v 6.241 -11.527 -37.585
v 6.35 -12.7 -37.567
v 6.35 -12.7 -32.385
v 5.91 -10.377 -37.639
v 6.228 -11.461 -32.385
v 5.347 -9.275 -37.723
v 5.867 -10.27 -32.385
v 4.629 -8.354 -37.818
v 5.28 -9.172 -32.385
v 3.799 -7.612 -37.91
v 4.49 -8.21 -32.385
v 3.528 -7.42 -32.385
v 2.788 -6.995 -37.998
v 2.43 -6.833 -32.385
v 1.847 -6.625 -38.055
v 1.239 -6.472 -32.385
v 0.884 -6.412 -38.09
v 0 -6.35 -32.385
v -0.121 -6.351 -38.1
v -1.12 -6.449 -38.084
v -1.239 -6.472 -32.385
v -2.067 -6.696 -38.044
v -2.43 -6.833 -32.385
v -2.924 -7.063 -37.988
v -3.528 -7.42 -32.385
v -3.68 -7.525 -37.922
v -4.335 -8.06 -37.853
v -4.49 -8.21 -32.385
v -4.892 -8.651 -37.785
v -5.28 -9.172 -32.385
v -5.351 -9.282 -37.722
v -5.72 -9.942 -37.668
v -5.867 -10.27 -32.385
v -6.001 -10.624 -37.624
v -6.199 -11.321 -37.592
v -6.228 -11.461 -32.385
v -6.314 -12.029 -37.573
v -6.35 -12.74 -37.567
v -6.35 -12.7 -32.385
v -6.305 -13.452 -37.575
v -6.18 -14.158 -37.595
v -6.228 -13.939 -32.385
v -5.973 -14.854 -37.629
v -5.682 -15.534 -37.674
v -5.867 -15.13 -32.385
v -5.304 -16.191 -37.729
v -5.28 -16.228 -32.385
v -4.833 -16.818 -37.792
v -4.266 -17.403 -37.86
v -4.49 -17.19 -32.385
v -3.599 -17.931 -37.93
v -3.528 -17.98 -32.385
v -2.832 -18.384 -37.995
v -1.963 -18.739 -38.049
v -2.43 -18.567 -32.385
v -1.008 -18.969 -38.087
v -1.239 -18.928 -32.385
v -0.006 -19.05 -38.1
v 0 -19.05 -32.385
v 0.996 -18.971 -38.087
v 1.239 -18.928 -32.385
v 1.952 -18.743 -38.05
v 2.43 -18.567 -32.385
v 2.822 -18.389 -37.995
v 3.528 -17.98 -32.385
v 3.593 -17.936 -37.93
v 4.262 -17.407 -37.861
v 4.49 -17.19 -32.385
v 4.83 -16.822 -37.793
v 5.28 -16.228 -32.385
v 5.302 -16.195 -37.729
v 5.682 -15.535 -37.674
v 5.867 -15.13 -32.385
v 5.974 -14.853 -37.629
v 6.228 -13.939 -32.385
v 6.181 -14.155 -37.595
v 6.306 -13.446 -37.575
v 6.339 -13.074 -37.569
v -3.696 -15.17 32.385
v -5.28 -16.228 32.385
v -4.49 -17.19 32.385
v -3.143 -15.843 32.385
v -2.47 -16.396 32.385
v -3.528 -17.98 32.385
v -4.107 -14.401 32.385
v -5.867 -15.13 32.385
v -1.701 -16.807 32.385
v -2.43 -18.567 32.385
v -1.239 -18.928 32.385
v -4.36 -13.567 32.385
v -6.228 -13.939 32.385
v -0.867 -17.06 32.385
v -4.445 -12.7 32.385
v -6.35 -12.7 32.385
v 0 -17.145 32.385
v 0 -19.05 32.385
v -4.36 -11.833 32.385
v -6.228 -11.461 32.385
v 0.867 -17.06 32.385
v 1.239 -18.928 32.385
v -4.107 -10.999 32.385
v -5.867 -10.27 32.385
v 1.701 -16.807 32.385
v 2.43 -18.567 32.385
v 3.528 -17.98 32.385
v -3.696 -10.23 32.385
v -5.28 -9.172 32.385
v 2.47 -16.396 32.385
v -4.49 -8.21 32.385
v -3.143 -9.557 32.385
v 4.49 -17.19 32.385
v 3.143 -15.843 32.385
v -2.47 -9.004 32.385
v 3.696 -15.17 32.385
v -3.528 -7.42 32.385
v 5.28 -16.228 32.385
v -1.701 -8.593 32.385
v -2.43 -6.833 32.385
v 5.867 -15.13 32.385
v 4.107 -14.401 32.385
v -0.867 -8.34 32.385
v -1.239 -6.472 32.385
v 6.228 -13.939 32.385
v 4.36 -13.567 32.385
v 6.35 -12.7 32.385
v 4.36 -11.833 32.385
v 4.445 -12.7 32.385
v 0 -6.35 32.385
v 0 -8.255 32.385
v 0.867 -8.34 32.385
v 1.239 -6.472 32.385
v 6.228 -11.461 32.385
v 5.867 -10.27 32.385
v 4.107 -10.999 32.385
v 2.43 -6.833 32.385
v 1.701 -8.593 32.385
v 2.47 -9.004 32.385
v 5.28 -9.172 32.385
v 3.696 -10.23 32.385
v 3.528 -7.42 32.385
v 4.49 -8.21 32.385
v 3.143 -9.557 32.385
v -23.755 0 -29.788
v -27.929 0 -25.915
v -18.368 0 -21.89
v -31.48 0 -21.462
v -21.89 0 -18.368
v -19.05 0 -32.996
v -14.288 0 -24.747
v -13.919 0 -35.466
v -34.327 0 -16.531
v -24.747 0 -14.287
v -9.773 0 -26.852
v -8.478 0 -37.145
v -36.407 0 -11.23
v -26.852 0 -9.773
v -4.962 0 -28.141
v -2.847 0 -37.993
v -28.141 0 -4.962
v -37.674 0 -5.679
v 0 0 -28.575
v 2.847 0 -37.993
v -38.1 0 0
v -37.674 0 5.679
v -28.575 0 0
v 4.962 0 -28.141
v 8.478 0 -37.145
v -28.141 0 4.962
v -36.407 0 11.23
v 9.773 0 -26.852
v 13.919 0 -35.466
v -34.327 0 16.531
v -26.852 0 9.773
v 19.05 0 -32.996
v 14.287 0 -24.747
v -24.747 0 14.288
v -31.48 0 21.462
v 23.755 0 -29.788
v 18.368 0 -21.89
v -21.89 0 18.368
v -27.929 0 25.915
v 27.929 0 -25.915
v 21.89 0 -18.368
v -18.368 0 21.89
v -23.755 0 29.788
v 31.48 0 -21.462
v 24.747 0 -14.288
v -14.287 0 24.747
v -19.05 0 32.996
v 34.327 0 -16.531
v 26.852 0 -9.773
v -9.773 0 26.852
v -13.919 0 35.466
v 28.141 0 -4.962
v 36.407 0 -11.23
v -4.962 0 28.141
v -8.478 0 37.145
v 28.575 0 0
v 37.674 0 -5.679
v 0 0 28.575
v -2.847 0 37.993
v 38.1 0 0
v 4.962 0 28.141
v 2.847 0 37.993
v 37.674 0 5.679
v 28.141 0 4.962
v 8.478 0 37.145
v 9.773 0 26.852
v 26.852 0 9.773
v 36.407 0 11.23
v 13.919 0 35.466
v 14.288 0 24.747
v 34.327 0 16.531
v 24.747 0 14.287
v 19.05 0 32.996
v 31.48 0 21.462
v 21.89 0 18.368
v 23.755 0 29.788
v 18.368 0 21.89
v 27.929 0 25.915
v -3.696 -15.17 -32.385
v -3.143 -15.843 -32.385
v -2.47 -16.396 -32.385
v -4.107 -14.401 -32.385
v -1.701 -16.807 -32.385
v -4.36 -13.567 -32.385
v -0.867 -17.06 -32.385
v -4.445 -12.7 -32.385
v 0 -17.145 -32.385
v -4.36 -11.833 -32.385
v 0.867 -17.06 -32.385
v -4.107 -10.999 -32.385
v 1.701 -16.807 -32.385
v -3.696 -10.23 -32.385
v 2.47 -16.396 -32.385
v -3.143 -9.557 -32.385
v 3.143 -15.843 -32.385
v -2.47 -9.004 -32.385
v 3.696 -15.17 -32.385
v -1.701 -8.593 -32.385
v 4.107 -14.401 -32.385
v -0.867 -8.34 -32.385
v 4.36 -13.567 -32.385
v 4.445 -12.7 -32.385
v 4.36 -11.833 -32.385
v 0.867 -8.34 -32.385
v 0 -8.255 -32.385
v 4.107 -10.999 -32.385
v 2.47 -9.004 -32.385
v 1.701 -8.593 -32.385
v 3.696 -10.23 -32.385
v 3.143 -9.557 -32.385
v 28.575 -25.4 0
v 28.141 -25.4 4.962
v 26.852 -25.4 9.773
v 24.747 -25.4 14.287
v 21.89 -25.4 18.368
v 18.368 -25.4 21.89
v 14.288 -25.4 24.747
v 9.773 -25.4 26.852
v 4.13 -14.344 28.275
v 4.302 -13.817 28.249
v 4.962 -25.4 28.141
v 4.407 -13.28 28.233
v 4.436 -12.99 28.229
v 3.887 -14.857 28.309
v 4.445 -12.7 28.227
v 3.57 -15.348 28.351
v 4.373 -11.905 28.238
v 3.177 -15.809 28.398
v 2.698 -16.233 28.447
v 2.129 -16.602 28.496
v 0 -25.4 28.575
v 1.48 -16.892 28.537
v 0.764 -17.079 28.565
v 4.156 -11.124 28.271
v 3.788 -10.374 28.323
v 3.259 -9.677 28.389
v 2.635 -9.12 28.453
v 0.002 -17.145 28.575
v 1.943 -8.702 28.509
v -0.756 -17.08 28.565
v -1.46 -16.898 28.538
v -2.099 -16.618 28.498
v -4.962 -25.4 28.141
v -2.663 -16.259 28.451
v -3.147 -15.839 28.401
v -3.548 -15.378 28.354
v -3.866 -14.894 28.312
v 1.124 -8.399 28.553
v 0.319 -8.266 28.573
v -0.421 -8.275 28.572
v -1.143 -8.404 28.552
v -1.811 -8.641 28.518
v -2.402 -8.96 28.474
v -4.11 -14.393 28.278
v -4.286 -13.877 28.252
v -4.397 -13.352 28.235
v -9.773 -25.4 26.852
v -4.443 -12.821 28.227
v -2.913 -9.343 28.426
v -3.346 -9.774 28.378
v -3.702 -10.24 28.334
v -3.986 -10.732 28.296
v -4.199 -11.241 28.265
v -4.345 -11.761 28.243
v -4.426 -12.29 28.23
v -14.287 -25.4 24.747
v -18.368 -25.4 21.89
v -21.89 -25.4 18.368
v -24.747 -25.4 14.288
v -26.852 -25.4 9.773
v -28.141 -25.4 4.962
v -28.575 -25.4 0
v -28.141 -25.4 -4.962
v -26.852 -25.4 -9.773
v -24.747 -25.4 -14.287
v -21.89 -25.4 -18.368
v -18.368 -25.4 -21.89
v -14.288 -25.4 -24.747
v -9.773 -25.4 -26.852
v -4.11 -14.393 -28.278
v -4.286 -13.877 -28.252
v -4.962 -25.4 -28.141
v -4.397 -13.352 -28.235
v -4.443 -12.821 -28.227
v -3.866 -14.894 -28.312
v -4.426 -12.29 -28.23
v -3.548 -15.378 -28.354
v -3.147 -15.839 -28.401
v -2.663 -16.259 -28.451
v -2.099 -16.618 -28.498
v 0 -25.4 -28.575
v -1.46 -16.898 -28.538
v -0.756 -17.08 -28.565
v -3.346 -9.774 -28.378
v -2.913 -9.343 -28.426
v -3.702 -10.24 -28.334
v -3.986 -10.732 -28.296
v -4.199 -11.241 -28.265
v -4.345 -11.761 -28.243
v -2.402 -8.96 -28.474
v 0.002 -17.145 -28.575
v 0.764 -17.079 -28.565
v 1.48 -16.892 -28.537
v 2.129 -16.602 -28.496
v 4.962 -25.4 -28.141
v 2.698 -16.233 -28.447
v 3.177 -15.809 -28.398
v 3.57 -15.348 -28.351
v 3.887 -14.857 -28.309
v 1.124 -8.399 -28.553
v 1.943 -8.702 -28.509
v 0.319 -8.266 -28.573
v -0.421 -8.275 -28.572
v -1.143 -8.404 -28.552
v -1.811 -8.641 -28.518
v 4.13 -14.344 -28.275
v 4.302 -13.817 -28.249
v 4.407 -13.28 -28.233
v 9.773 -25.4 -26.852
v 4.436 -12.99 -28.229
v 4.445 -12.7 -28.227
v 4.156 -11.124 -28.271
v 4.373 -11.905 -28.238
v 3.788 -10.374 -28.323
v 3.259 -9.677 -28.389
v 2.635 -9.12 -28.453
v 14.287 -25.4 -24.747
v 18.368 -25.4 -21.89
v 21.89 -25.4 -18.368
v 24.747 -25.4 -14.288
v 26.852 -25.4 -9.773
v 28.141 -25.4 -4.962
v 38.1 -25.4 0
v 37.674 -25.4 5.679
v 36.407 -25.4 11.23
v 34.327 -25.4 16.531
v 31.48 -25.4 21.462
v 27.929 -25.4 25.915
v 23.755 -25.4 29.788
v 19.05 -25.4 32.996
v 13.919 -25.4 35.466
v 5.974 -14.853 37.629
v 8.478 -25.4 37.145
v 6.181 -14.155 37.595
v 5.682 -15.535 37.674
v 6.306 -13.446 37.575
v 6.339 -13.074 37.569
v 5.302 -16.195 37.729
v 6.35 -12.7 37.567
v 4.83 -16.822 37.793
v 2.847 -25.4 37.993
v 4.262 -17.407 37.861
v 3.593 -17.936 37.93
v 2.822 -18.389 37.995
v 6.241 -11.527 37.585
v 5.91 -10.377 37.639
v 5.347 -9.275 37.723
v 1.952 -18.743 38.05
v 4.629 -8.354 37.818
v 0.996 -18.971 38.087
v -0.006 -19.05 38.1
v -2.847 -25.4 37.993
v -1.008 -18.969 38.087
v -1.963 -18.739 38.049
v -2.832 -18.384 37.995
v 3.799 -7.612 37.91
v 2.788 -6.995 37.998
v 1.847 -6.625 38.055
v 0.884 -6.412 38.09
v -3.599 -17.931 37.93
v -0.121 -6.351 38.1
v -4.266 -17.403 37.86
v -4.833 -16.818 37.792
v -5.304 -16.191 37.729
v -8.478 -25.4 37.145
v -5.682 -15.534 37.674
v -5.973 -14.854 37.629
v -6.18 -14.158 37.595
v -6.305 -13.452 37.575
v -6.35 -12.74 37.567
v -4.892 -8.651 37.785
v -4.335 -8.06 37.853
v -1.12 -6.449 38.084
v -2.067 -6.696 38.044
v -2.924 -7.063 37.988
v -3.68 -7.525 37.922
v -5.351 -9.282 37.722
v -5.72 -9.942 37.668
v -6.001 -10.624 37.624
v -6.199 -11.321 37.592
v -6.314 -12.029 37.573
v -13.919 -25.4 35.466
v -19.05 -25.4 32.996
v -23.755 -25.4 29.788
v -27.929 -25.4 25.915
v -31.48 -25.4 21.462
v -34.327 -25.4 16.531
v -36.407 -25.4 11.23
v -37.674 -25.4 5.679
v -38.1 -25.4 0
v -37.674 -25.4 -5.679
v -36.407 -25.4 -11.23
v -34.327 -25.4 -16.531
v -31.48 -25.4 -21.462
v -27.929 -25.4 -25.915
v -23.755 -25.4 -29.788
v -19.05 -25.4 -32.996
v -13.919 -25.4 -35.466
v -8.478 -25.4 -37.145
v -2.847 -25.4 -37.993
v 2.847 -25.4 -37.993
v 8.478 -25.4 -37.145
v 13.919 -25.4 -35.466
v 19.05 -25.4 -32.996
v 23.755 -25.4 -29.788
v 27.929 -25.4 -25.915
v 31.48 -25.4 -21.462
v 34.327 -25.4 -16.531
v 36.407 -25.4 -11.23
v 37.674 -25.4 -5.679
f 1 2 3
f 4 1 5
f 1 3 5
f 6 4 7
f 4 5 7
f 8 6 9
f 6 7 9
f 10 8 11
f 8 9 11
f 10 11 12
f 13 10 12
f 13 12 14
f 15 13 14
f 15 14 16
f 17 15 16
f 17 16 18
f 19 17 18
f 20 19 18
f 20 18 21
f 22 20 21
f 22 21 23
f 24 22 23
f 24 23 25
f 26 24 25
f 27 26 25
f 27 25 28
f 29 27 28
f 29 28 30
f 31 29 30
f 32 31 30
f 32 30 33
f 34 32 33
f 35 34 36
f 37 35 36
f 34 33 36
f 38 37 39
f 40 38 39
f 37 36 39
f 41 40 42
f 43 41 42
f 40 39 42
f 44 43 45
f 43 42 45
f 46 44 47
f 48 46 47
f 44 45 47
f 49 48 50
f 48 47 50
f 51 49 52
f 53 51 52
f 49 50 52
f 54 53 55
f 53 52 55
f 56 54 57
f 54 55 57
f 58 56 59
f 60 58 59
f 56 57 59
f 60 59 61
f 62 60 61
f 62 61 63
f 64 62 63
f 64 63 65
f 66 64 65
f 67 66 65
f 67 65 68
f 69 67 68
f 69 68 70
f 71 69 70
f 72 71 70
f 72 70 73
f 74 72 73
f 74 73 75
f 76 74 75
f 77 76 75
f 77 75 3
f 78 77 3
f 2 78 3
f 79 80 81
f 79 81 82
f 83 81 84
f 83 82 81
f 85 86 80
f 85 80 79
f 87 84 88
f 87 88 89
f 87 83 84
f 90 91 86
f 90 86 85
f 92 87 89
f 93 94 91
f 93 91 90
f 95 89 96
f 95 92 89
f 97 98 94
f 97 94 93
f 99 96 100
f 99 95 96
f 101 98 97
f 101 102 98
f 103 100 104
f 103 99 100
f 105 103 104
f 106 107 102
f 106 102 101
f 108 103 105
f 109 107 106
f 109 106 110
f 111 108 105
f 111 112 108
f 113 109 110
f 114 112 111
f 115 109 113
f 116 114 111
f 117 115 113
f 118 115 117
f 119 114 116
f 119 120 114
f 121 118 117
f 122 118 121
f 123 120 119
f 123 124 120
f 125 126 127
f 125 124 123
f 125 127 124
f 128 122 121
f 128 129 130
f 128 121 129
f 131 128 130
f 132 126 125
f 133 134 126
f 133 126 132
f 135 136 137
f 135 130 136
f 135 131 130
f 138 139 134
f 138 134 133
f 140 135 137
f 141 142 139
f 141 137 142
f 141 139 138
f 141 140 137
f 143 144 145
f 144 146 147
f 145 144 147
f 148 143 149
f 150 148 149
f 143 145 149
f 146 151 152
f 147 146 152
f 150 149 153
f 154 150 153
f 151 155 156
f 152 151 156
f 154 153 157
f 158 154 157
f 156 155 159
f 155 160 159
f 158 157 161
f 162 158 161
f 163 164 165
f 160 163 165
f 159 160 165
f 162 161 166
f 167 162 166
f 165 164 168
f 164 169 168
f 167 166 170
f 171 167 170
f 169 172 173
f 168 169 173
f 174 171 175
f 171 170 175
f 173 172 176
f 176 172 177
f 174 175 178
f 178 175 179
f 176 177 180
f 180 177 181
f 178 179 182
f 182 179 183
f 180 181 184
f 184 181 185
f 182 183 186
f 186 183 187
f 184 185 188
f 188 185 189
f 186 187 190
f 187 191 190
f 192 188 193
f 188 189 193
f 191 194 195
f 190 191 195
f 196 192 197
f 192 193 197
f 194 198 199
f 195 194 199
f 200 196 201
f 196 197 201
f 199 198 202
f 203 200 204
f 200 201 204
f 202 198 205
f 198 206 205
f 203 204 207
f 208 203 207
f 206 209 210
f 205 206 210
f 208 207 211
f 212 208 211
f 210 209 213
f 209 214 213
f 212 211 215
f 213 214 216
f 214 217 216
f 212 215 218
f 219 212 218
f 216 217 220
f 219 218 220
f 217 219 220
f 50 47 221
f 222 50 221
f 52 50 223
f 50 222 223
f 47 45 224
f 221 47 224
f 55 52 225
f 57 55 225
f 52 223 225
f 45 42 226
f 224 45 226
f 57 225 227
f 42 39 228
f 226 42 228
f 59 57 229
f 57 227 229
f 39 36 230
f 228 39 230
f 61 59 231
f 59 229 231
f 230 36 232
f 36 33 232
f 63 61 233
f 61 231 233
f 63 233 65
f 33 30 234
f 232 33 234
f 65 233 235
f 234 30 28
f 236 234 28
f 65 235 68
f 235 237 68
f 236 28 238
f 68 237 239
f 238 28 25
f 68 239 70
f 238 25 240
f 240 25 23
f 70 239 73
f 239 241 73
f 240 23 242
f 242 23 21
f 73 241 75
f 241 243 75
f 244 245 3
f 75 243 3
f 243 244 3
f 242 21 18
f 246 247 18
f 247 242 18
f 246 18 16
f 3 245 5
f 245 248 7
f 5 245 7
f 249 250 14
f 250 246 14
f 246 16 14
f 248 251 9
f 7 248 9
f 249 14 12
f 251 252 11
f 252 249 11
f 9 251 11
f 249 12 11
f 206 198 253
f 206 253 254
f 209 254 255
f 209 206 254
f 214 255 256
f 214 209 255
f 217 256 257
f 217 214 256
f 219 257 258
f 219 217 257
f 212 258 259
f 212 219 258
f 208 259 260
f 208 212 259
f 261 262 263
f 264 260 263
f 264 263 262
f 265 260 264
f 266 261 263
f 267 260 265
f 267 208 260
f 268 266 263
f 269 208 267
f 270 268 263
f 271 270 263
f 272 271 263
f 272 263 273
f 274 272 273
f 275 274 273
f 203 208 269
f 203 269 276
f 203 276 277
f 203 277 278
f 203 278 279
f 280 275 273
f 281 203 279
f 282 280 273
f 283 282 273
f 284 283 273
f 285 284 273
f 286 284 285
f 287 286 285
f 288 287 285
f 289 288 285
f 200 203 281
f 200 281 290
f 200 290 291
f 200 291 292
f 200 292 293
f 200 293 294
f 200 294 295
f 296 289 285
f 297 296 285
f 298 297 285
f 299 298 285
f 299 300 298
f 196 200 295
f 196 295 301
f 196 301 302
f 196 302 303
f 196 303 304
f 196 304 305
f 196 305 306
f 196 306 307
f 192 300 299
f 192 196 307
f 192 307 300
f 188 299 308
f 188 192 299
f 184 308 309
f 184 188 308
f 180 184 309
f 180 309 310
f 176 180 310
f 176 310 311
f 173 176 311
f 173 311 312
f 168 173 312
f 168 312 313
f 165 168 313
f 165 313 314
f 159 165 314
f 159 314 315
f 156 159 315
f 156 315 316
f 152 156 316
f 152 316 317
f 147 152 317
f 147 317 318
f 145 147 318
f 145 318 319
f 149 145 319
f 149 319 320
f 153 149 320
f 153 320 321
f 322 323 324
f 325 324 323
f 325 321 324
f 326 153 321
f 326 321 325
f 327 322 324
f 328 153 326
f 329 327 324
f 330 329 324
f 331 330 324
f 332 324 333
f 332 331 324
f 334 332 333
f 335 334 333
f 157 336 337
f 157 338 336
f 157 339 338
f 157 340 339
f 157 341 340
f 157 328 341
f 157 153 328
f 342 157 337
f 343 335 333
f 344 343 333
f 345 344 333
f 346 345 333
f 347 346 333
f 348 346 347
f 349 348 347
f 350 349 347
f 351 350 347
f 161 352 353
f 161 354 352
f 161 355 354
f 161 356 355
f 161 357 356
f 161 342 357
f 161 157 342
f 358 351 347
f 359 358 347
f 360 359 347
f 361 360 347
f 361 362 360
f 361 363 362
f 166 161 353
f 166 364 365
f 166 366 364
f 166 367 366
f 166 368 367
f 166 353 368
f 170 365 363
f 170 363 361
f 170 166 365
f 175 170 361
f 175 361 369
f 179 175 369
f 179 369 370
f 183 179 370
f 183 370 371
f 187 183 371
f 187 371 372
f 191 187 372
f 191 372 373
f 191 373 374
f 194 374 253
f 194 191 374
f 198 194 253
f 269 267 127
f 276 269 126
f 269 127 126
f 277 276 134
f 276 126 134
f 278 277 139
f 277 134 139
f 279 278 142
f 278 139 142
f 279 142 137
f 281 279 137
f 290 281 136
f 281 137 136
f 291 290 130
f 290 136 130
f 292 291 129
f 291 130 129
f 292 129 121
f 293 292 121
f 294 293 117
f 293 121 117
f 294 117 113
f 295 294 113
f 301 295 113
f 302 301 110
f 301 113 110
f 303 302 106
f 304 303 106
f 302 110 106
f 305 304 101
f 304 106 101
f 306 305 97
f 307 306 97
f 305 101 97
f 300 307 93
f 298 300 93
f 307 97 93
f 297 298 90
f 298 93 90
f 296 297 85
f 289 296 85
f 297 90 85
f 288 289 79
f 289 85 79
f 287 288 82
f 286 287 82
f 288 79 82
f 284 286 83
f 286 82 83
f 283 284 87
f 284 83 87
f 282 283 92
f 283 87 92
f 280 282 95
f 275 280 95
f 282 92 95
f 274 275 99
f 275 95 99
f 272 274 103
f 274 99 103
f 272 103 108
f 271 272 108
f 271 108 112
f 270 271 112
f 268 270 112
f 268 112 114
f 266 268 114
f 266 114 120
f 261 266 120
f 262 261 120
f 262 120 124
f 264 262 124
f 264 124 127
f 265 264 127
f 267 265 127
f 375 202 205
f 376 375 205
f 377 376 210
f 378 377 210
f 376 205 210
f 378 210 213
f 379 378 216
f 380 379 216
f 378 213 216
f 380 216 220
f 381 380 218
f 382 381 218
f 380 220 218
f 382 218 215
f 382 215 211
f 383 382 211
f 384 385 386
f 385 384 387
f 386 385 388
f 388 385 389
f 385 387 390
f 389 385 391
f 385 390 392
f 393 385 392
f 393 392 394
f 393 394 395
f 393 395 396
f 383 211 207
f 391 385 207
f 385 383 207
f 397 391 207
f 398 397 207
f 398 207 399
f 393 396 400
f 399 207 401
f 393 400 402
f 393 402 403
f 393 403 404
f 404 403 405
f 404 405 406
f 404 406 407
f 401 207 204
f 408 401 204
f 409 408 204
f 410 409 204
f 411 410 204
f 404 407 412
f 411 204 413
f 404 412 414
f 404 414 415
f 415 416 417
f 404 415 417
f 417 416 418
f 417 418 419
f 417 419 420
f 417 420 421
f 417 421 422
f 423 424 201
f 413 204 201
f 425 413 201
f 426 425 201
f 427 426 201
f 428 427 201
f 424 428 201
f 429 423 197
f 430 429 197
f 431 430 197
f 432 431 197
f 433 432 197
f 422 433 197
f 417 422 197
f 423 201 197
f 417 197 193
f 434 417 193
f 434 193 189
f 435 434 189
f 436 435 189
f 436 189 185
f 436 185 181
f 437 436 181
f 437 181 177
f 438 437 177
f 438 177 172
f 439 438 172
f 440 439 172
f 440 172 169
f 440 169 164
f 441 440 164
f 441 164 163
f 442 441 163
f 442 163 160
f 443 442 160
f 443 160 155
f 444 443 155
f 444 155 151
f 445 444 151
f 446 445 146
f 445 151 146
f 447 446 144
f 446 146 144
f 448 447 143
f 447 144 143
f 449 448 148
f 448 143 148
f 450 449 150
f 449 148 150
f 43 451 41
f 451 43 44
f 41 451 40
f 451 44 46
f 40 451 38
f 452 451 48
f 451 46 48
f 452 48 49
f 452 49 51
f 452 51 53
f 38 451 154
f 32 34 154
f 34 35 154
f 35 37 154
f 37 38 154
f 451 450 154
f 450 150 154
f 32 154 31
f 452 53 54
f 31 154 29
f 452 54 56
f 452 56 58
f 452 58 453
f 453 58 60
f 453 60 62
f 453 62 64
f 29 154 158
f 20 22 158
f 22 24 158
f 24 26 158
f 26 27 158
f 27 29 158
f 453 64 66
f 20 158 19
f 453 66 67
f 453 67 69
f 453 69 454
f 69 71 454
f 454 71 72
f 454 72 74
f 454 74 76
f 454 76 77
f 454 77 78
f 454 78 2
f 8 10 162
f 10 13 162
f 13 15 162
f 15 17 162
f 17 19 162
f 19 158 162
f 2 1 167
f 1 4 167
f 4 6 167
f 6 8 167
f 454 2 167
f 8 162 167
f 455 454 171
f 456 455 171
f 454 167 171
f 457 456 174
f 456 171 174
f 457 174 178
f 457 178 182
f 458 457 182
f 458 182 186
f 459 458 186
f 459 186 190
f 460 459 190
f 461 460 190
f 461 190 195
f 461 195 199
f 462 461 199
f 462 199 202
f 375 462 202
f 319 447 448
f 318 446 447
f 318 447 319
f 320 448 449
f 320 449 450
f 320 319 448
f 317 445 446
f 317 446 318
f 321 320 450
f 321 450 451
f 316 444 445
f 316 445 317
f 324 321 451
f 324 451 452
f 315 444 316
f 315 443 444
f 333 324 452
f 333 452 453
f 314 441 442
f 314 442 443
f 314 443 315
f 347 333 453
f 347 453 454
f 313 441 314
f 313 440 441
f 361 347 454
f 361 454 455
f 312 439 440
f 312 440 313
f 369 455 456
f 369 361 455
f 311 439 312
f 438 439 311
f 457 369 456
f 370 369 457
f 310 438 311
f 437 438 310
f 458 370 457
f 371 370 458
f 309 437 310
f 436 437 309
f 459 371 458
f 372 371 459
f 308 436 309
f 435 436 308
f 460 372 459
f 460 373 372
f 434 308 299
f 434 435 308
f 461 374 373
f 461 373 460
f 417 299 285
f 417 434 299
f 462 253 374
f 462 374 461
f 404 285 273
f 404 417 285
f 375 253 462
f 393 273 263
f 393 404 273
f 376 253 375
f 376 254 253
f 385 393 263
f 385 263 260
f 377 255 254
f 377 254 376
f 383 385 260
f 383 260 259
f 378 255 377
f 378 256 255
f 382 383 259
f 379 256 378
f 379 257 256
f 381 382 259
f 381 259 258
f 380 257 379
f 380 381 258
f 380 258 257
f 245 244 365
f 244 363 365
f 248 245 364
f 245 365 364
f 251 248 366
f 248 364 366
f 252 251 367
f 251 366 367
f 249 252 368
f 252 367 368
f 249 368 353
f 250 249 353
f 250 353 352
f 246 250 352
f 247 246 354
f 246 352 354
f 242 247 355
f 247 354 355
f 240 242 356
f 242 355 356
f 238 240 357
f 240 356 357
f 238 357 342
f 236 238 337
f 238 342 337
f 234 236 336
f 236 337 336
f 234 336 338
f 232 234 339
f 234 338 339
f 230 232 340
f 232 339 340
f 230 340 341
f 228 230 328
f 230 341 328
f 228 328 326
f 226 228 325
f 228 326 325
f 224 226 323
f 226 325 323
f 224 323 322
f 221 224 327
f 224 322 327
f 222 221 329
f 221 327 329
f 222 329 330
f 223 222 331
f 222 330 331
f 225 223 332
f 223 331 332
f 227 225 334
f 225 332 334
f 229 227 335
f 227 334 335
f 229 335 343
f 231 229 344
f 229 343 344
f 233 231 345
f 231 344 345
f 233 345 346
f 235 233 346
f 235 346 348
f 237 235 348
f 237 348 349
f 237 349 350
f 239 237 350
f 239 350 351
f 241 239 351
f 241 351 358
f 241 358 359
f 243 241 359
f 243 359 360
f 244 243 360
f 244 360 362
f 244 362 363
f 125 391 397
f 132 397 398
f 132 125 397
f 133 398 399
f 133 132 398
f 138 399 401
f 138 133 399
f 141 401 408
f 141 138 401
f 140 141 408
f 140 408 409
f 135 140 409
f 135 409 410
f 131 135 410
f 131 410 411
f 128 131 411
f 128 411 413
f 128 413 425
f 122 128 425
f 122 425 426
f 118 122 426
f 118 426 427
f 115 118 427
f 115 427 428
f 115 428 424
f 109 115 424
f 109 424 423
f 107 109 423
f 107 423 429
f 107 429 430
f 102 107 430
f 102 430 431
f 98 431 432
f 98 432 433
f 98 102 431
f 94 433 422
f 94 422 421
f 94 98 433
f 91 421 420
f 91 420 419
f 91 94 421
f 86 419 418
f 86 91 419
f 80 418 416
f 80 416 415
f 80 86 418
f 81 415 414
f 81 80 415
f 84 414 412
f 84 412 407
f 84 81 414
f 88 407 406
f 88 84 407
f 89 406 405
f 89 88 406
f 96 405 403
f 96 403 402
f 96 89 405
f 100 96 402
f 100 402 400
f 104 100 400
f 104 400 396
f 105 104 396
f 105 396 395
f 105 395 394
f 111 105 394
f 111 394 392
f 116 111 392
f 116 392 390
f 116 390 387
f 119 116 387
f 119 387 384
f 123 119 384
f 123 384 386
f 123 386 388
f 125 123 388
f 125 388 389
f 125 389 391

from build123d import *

# Parameters (mm, degrees)
F0_R     = 38.1
F0_R_2   = 28.575
F1_DEPTH = 25.4
F2_R     = 4.445
F3_DEPTH = 38.1
F5_R     = 6.35
F5_R_2   = 4.445
F6_DEPTH = 25.4
F8_R     = 6.35
F8_R_2   = 4.445
F9_DEPTH = 25.4


with BuildPart() as f1:
    # F0 (on Front) → F1 (new body)
    with BuildSketch(Plane.XZ):
        Circle(F0_R)
        Circle(F0_R_2, mode=Mode.SUBTRACT)
    extrude(amount=F1_DEPTH)

    # F2 (on Top) → F3 (cut, symmetric)
    with BuildSketch(Plane.XY):
        with Locations((0, -12.7)):
            Circle(F2_R)
    extrude(amount=F3_DEPTH, both=True, mode=Mode.SUBTRACT)

    # F5 (on offset) → F6 (cut)
    with BuildSketch(Plane.XY.offset(32.385)):
        with Locations((0, -12.7)):
            Circle(F5_R)
        with Locations((0, -12.7)):
            Circle(F5_R_2, mode=Mode.SUBTRACT)
    extrude(amount=F6_DEPTH, mode=Mode.SUBTRACT)

    # F8 (on offset) → F9 (cut)
    with BuildSketch(Plane.XY.offset(-32.385)):
        with Locations((0, -12.7)):
            Circle(F8_R)
        with Locations((0, -12.7)):
            Circle(F8_R_2, mode=Mode.SUBTRACT)
    extrude(amount=-F9_DEPTH, mode=Mode.SUBTRACT)


solid = f1.part
